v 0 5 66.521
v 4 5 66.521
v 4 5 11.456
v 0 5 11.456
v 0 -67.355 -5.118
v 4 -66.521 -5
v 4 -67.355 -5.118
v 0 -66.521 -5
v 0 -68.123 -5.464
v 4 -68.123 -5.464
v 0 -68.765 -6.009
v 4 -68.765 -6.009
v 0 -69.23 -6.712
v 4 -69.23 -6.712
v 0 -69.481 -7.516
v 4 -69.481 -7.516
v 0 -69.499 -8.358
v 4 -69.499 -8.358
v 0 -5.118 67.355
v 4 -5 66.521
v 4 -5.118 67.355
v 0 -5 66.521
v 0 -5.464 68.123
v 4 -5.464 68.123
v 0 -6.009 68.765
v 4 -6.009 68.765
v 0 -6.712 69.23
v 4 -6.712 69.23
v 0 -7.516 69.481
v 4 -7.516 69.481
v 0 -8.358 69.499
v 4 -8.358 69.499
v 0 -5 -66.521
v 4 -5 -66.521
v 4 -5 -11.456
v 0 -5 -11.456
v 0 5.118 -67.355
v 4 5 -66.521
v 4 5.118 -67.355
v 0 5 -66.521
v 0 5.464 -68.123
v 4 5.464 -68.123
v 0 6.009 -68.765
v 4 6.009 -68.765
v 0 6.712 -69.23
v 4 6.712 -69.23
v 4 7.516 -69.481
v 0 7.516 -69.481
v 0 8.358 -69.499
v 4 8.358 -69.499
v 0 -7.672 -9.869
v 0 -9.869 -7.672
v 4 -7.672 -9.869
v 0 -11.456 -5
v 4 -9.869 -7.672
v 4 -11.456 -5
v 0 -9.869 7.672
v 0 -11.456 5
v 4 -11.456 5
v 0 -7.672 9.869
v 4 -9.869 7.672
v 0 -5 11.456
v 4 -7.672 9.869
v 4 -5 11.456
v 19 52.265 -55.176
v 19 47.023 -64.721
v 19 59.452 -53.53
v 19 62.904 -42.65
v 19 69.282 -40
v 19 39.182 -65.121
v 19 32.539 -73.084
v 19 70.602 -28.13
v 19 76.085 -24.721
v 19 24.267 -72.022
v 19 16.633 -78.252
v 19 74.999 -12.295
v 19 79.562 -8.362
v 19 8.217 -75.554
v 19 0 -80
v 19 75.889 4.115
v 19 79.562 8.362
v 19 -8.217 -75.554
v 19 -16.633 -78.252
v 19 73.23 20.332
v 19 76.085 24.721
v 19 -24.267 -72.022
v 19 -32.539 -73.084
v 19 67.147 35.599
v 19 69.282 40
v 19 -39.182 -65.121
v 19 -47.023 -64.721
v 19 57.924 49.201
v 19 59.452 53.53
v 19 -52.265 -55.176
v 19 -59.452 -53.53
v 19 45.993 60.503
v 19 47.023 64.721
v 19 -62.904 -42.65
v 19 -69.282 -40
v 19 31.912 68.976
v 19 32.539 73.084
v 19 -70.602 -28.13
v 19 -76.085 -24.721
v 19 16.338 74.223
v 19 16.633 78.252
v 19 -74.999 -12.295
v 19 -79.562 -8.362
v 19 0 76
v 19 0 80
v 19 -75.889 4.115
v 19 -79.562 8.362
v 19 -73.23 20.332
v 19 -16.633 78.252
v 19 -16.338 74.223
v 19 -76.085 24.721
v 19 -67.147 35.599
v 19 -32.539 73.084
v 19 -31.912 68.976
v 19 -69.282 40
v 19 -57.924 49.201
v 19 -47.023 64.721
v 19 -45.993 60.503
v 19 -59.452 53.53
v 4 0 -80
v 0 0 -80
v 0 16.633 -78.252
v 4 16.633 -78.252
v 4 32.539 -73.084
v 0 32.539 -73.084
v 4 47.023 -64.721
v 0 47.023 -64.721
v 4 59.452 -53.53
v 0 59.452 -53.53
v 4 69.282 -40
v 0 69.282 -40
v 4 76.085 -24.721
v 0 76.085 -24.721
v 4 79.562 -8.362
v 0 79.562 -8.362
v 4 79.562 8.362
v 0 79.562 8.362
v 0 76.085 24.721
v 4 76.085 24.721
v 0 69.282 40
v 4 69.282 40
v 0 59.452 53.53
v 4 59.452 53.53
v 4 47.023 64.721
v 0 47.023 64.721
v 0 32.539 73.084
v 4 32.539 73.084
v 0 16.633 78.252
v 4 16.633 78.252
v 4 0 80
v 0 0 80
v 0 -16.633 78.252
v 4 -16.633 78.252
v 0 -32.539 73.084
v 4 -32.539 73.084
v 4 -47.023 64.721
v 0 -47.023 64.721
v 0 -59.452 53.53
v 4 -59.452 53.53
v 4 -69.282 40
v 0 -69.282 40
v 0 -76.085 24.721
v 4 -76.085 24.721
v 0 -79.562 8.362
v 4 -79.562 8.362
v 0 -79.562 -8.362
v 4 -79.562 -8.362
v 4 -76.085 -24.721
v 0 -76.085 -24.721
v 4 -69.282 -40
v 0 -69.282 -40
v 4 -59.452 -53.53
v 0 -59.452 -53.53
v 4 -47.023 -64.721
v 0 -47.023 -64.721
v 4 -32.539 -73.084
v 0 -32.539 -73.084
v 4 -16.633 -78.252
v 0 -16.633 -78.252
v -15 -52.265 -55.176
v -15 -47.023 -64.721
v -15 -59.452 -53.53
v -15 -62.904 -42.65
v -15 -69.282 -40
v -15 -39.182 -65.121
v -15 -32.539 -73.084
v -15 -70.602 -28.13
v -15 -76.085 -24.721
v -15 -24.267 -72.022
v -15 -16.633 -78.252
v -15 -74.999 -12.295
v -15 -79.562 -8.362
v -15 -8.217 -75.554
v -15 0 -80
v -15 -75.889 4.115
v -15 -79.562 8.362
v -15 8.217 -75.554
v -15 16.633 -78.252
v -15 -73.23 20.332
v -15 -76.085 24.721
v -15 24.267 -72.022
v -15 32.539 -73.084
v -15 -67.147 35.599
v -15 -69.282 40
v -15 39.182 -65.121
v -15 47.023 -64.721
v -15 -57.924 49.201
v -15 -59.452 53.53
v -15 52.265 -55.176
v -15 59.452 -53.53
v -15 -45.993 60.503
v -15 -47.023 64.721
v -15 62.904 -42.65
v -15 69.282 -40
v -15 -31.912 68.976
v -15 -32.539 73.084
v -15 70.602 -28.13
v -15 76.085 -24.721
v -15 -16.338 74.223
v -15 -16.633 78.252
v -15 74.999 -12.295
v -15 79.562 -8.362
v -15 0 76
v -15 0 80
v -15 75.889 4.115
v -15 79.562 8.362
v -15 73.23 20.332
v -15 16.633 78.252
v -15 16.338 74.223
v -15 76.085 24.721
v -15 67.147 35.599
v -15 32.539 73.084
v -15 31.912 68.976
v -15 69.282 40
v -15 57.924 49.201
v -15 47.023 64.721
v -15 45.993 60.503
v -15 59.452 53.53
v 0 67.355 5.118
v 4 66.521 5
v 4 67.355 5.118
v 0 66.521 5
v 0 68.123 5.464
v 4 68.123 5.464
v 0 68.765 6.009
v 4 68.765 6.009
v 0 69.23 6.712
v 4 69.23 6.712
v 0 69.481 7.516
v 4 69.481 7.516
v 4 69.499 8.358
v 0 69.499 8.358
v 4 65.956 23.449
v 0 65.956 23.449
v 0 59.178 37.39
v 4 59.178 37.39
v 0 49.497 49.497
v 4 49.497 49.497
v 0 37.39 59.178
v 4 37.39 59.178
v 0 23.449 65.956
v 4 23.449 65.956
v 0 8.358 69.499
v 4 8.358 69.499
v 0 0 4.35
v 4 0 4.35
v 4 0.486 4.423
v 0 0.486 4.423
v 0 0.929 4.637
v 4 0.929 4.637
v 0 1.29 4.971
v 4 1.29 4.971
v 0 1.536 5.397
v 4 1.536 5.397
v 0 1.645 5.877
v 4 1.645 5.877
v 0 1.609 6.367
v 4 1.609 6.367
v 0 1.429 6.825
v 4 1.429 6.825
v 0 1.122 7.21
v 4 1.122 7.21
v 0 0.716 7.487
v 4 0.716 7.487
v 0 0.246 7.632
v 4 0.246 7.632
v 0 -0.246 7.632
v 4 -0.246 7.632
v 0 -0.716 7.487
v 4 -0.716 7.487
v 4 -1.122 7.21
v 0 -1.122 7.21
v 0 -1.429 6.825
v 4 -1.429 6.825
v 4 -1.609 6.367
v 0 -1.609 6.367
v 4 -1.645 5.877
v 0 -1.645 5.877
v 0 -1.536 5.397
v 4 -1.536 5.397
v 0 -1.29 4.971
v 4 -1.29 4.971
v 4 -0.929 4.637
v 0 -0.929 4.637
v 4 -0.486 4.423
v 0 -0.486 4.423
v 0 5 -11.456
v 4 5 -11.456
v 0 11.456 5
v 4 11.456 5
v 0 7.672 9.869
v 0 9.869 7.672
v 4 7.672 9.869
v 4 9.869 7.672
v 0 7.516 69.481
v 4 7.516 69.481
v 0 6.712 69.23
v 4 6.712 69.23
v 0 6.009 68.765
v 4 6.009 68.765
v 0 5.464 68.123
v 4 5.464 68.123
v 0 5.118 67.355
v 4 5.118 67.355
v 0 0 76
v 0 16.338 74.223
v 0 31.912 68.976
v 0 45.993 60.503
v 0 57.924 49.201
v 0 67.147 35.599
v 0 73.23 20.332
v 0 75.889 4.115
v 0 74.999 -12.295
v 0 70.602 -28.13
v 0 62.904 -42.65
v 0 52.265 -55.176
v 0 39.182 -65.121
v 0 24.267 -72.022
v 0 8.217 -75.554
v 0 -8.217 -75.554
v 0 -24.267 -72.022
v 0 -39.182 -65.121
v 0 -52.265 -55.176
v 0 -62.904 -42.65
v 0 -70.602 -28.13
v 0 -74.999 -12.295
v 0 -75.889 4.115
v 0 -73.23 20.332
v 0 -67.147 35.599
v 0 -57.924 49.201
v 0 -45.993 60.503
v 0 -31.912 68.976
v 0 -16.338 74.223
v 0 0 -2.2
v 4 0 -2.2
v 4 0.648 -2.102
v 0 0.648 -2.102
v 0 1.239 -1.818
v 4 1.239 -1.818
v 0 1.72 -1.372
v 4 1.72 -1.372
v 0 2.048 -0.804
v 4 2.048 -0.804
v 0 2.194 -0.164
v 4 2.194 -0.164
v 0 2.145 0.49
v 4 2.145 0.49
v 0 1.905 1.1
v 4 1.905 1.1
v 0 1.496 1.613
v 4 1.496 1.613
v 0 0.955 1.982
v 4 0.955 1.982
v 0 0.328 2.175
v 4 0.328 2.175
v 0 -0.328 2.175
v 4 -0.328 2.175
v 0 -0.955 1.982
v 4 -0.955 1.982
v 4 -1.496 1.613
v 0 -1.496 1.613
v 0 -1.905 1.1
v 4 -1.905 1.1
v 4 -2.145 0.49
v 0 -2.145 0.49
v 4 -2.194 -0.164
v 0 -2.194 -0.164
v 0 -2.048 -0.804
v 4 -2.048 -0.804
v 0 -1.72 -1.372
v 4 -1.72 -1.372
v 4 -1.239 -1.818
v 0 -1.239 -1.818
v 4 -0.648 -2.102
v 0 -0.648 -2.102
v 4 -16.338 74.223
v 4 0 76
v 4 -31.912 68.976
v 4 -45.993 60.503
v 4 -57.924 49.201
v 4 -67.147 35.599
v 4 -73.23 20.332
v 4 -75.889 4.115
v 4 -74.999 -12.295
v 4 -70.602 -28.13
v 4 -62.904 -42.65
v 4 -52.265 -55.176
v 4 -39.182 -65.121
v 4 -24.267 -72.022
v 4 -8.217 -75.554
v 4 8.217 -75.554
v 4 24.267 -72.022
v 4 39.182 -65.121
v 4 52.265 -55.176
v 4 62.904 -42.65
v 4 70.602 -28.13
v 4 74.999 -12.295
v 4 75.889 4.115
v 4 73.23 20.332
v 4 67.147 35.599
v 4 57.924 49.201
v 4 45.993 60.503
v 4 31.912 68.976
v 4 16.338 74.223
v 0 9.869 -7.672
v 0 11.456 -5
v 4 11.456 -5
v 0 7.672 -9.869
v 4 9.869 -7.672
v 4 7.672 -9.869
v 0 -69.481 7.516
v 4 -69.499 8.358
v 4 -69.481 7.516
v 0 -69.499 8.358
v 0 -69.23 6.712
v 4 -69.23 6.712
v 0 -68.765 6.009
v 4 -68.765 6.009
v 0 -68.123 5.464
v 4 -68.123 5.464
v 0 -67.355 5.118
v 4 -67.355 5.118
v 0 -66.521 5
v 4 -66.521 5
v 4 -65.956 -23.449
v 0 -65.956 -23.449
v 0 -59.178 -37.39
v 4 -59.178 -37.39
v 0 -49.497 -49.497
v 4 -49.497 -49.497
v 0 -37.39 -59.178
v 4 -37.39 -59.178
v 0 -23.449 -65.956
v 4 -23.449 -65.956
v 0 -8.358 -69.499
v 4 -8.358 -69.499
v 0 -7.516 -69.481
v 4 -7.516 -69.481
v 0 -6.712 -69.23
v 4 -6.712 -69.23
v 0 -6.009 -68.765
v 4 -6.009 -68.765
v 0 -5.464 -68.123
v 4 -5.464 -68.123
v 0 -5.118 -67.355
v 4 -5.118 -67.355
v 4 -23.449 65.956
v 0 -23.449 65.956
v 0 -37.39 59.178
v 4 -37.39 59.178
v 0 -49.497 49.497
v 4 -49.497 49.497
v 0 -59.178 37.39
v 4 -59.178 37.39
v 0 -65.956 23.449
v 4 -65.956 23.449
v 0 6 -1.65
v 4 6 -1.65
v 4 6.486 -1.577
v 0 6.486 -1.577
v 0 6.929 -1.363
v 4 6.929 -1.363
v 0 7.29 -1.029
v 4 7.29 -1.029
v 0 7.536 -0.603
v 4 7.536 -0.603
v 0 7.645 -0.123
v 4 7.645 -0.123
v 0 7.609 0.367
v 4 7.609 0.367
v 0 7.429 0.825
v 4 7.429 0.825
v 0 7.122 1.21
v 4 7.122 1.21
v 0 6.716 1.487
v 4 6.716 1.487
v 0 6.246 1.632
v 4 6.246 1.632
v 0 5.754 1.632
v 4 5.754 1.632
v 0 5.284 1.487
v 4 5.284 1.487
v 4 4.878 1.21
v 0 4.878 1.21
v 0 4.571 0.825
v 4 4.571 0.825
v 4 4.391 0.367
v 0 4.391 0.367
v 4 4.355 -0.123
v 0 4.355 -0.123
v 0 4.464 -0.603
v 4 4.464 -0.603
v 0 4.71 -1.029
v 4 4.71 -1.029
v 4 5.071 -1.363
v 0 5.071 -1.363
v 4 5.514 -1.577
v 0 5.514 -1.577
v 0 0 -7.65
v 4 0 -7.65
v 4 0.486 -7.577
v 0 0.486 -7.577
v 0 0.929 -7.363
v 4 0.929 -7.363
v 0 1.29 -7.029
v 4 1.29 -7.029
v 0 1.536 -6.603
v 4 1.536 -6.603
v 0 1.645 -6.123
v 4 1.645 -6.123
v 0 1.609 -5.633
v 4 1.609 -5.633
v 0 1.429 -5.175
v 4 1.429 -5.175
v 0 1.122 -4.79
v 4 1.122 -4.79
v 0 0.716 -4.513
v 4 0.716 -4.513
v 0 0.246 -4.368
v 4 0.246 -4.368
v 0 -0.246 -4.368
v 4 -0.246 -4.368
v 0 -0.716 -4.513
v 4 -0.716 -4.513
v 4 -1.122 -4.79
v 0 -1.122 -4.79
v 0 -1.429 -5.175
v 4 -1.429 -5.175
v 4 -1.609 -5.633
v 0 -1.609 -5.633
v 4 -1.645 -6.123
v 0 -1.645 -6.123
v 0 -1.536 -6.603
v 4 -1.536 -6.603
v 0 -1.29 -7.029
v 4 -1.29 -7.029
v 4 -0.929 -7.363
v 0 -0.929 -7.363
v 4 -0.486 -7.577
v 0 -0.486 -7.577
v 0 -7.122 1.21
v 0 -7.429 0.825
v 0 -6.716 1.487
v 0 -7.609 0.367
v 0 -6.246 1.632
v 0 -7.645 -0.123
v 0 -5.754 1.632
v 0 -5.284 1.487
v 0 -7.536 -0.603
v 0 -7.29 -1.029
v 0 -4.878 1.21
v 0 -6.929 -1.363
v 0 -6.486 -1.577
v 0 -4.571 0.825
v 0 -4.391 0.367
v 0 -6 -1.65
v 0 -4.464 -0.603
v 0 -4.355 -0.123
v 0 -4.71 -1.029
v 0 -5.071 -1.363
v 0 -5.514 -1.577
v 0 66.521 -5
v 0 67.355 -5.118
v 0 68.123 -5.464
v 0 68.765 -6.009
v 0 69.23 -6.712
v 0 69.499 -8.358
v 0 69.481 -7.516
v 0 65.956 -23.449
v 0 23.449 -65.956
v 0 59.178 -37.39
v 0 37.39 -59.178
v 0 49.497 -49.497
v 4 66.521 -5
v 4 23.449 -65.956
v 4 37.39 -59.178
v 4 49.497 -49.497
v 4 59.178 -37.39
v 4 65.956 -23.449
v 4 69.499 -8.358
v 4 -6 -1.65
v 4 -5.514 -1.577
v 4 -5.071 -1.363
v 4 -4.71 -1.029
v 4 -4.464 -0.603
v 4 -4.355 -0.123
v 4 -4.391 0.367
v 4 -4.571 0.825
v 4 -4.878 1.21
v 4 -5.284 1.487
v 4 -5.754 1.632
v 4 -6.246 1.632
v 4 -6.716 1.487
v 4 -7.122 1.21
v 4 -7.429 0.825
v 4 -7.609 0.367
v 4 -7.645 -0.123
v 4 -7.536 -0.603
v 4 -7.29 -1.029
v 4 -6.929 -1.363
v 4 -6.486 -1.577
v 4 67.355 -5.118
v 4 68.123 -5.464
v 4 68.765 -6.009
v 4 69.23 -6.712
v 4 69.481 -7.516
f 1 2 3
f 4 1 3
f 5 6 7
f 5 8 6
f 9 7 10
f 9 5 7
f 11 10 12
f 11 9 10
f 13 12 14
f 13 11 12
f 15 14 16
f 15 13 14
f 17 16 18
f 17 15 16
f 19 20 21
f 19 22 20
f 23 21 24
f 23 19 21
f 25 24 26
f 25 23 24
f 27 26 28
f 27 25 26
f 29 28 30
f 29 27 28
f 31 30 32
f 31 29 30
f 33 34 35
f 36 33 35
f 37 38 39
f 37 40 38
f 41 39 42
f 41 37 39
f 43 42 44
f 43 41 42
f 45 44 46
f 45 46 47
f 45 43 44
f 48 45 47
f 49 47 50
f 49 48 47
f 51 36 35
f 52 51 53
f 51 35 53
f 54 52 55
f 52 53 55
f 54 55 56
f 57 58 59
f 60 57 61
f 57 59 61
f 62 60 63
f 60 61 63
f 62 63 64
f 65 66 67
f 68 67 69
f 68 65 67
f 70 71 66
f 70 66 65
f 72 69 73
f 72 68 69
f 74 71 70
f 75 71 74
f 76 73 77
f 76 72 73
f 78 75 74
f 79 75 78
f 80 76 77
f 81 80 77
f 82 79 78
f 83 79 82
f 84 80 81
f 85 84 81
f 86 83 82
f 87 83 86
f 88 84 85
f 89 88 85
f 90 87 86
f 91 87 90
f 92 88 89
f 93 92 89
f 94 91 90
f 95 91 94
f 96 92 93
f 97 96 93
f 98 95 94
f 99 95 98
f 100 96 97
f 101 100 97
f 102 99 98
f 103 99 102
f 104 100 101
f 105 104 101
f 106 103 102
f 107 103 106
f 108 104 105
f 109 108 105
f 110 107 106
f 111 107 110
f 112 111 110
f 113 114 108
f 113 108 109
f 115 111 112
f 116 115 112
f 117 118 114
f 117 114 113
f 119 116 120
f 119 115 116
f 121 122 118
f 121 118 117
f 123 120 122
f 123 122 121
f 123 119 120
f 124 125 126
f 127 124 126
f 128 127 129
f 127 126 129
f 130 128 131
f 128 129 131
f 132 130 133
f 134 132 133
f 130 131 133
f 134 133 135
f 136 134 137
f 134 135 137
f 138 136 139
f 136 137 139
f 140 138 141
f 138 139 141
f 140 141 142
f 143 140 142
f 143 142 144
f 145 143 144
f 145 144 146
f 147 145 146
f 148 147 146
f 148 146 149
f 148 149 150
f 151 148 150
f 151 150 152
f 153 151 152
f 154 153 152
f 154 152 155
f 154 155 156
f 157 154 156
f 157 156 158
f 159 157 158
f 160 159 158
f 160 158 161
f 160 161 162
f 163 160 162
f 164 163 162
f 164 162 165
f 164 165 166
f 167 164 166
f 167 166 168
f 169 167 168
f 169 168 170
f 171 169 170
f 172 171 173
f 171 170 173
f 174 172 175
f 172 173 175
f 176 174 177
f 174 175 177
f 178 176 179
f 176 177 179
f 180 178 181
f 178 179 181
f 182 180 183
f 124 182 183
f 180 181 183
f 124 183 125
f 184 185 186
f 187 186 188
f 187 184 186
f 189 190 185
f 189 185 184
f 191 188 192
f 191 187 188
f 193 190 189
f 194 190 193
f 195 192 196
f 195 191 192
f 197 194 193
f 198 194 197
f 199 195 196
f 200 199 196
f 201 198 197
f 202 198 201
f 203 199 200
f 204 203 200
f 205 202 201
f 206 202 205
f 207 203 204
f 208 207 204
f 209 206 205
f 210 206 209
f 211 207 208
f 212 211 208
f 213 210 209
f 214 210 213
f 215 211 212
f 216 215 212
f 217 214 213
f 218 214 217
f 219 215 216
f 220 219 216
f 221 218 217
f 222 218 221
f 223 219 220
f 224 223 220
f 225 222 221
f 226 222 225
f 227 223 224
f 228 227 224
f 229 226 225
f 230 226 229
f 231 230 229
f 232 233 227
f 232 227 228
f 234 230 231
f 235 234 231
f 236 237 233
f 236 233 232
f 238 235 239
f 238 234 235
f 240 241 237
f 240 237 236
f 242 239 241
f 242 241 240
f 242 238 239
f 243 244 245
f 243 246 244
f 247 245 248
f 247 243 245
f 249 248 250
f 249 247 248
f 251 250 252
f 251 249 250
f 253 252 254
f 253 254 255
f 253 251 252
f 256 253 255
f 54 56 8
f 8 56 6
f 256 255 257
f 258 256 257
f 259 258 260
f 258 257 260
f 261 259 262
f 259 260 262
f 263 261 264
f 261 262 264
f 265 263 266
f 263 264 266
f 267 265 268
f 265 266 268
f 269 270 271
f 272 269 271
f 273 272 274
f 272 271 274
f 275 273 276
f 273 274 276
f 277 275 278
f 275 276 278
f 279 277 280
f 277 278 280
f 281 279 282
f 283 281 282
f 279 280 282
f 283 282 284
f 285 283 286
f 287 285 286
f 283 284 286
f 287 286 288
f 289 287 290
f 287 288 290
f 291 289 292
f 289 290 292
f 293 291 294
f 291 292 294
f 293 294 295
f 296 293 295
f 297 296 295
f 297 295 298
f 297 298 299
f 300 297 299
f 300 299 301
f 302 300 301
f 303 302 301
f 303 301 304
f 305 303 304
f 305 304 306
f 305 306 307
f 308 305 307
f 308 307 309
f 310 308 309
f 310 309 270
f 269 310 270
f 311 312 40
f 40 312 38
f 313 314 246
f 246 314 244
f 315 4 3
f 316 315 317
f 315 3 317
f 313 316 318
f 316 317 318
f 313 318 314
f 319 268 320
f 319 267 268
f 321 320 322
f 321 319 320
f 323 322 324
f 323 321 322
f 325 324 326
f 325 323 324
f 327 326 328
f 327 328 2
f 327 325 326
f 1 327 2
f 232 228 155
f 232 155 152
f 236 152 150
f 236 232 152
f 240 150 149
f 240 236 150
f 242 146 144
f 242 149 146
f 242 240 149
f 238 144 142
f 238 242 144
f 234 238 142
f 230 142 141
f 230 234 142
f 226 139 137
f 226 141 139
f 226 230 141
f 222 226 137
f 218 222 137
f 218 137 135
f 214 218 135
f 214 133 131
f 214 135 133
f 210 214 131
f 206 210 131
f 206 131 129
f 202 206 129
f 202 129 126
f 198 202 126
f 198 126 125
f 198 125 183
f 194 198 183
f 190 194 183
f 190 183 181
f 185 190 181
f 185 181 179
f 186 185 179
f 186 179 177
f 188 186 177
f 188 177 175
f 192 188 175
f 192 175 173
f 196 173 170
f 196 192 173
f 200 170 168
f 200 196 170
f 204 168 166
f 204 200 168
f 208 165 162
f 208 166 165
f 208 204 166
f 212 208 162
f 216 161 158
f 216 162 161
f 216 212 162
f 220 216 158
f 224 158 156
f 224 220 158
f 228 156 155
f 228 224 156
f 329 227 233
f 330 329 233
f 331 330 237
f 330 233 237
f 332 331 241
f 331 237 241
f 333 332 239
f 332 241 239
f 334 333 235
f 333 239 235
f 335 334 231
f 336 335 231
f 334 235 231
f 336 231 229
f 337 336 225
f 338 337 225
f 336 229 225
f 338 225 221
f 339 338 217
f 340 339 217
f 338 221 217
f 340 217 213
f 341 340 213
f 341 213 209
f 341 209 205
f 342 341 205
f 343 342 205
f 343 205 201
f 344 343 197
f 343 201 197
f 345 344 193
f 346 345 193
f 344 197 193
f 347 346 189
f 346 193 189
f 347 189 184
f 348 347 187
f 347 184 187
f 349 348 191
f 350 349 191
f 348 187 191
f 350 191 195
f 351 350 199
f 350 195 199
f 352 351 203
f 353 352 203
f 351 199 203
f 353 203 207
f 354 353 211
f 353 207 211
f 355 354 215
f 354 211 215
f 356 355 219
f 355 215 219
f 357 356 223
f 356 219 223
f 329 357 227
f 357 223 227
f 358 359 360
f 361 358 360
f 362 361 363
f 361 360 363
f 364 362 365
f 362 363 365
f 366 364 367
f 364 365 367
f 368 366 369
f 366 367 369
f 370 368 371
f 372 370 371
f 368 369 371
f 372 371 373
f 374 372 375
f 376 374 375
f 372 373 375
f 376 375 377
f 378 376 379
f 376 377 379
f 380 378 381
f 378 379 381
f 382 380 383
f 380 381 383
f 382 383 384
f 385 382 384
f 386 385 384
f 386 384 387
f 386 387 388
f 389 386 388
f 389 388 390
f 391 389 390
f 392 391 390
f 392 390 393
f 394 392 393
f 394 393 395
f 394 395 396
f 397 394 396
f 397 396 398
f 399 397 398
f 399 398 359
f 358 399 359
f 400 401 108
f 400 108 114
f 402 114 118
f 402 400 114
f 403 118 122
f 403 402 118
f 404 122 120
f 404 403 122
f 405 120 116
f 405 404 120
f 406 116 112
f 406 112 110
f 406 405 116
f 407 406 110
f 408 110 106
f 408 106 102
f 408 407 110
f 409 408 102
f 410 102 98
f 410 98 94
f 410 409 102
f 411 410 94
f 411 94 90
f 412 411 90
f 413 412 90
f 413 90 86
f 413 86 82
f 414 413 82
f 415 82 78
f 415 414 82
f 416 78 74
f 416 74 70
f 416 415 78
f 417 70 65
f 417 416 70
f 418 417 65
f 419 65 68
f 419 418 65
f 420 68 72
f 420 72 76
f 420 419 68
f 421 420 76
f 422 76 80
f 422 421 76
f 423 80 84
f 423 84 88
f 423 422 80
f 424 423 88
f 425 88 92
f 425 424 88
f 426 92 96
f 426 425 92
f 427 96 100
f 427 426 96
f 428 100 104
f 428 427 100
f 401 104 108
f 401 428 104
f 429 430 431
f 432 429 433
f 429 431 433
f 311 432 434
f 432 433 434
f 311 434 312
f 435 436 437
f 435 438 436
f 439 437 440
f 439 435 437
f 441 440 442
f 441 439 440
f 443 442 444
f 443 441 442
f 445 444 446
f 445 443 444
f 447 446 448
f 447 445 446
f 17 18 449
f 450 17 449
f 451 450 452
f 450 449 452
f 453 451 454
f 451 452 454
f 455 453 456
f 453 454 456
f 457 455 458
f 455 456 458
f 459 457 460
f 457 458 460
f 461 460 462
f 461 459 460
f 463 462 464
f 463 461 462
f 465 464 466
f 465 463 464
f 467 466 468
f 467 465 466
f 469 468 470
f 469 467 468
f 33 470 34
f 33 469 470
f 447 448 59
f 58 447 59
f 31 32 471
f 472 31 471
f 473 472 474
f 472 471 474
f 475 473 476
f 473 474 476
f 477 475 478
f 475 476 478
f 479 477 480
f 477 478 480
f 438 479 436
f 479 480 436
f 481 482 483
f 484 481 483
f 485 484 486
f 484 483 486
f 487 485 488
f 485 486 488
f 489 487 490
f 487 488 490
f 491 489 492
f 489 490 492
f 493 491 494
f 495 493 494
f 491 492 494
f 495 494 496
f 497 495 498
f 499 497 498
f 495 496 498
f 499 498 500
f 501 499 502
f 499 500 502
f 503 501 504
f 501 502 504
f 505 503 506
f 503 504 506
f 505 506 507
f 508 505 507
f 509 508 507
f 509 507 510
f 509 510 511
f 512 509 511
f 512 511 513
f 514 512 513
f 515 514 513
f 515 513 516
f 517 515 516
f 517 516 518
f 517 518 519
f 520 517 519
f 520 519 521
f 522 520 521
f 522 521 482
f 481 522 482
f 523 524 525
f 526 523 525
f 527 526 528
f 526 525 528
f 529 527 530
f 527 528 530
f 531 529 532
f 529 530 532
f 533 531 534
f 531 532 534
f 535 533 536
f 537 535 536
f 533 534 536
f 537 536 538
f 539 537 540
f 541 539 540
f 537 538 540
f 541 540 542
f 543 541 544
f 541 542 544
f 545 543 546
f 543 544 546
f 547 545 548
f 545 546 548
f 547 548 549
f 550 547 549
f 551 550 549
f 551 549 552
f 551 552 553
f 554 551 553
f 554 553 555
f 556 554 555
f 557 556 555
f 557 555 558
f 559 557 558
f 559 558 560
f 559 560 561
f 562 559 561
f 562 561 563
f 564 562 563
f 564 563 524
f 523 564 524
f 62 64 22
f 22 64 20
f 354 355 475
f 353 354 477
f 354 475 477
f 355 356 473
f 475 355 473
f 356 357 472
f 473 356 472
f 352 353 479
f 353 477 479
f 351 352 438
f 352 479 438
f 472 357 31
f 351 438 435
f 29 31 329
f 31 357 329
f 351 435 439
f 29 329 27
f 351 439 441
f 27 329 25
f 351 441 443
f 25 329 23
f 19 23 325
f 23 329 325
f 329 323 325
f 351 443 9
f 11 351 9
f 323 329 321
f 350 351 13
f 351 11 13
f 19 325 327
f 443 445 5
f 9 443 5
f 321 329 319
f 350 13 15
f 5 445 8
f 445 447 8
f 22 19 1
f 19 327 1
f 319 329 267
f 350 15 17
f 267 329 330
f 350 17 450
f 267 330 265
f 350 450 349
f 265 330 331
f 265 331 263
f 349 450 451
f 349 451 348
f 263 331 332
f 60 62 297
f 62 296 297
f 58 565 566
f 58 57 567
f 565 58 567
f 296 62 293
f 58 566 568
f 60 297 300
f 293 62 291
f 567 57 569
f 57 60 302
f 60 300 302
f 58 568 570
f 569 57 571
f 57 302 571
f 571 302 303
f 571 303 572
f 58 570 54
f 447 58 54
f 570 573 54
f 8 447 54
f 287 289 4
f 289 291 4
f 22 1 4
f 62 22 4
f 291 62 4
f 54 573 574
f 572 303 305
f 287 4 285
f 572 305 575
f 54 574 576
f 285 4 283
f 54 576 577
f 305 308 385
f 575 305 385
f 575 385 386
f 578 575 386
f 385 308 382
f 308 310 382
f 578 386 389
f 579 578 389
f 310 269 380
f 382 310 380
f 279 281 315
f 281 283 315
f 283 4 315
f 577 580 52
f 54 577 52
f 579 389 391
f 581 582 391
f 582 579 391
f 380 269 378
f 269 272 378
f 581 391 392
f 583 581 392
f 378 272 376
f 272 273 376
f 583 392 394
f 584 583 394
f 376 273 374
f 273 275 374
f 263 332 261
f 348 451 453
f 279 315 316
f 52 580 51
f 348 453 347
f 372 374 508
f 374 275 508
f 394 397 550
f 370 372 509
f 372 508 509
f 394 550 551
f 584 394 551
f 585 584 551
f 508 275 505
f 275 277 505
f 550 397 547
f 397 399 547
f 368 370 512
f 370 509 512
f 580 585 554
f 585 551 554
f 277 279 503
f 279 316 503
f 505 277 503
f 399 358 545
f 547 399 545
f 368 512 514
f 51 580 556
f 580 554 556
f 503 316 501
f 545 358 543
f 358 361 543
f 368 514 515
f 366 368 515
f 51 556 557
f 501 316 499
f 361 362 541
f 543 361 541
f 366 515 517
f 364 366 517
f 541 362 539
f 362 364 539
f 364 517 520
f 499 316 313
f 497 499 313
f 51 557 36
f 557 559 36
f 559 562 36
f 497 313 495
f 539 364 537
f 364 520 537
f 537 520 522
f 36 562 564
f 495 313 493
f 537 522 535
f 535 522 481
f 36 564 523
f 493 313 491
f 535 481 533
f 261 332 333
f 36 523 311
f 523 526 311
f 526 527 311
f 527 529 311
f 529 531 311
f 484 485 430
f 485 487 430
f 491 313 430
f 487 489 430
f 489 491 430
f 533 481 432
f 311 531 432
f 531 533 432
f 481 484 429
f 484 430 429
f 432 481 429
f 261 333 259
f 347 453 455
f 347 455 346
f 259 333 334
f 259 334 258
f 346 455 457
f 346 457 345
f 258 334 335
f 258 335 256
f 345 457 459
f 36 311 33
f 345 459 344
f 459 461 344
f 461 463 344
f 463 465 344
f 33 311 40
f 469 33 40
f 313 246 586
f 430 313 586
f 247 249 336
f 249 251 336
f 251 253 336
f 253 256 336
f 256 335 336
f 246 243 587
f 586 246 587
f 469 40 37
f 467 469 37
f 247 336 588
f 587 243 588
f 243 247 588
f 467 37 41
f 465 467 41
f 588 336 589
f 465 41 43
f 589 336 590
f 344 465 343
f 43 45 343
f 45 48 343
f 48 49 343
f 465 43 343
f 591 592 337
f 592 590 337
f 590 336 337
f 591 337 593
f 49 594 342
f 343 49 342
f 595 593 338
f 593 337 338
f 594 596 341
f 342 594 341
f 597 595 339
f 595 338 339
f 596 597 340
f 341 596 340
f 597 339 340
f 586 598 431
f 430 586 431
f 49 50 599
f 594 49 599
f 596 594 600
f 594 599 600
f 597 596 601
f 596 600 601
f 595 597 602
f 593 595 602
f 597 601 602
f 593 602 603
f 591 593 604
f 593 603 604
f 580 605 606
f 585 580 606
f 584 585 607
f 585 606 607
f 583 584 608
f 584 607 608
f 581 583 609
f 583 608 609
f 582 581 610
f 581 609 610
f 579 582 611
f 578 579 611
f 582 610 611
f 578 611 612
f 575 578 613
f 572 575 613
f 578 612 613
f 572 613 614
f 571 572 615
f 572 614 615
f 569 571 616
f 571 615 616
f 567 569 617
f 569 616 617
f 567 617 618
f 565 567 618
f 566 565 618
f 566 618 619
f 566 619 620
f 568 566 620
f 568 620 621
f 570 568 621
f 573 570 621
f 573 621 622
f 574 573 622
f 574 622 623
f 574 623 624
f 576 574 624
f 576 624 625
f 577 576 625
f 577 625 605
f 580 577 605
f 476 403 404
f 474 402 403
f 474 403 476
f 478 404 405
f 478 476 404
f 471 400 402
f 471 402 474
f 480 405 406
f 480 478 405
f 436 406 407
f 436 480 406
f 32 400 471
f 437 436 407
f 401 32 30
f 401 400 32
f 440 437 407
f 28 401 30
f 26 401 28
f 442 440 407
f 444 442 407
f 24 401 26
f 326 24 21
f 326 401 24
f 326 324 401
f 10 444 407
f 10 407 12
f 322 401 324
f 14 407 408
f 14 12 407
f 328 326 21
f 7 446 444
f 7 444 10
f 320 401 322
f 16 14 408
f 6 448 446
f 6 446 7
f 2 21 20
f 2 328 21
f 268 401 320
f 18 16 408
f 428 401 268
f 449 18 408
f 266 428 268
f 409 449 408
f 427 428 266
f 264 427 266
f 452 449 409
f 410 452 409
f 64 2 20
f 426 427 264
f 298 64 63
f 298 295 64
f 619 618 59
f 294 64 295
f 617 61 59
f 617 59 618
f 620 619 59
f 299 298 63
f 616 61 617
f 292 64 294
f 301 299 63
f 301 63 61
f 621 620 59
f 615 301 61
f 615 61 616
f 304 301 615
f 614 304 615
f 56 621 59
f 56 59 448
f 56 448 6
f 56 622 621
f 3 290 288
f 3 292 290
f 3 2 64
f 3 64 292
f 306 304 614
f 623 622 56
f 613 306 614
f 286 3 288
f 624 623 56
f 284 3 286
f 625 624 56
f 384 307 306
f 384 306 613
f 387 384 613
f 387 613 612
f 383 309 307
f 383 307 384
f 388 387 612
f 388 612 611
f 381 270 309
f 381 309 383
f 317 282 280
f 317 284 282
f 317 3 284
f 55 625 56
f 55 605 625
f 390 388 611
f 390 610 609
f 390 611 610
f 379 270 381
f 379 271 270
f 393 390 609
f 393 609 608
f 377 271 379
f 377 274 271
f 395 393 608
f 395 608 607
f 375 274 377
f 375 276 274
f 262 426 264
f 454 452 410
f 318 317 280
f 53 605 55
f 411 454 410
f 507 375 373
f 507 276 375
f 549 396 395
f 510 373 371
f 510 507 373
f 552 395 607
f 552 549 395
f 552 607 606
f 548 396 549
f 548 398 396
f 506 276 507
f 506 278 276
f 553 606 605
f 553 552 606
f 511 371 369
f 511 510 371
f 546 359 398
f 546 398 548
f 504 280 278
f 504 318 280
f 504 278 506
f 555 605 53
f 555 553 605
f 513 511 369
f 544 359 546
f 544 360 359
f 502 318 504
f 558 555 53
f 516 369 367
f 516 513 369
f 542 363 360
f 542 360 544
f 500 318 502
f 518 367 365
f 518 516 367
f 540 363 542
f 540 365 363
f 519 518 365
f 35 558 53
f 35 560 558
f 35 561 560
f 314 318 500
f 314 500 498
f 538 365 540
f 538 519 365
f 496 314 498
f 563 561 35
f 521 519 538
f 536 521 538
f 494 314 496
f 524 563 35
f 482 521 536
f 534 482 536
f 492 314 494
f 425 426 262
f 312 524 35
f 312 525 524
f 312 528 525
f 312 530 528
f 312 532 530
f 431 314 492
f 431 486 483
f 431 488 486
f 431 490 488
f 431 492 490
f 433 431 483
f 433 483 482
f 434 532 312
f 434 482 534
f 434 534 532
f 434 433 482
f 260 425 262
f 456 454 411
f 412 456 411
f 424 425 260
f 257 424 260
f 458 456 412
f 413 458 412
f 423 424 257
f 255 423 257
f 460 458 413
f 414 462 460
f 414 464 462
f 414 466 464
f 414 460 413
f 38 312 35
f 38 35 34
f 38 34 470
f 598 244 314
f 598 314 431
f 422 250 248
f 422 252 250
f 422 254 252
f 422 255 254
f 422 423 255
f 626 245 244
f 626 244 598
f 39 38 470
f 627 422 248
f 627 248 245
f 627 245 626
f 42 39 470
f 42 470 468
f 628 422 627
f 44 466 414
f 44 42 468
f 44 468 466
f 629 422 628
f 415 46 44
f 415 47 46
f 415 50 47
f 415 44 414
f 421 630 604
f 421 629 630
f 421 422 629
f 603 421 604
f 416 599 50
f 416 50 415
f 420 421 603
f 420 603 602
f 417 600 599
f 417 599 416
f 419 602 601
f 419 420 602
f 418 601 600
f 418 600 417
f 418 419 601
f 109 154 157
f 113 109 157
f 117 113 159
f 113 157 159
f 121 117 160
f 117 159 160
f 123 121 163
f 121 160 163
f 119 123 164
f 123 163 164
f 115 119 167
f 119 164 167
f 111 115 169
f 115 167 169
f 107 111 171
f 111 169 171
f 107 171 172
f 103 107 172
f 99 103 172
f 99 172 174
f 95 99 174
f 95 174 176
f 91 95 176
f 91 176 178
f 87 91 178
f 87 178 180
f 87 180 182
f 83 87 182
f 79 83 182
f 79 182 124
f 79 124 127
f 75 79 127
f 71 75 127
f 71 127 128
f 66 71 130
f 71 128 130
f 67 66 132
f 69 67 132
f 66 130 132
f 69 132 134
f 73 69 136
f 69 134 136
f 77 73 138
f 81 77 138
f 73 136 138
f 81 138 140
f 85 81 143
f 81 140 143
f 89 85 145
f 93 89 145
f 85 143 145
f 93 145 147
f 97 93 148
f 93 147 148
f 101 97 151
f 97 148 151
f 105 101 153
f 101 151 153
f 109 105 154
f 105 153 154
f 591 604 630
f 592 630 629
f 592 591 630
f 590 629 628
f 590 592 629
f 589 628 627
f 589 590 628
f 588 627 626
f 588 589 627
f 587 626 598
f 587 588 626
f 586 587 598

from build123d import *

# Parameters (mm, degrees)
SKETCH3_R           = 80
BOSS_EXTRUDE3_DEPTH = 4
SKETCH5_R           = 1.65
CUT_EXTRUDE3_DEPTH  = 114.207773585
CUT_EXTRUDE4_DEPTH  = 114.207773585
CIRPATTERN2_COUNT   = 4
FILLET2_R           = 3
BOSS_EXTRUDE4_START = 15
SKETCH7_R           = 80
SKETCH7_R_2         = 76
BOSS_EXTRUDE4_DEPTH = 15
SKETCH8_R           = 2.2
CUT_EXTRUDE5_DEPTH  = 115.721401665
SKETCH9_R           = 80
SKETCH9_R_2         = 76
BOSS_EXTRUDE5_DEPTH = 15


with BuildPart() as part:
    # Sketch3 → Boss-Extrude3 (new body)
    with BuildSketch(Plane.YZ):
        with Locations(Location((0, 0, 0), (0, 0, 270))):
            Circle(SKETCH3_R)
    extrude(amount=BOSS_EXTRUDE3_DEPTH)

    # Sketch5 → Cut-Extrude3 (cut, through all)
    with BuildSketch(Plane.YZ.offset(4)):
        with Locations(Location((0, 6, 0), (0, 0, 270))):
            Circle(SKETCH5_R)
        with Locations(Location((6, 0, 0), (0, 0, 270))):
            Circle(SKETCH5_R)
        with Locations(Location((0, -6, 0), (0, 0, 270))):
            Circle(SKETCH5_R)
        with Locations(Location((-6, 0, 0), (0, 0, 270))):
            Circle(SKETCH5_R)
    extrude(amount=-CUT_EXTRUDE3_DEPTH, mode=Mode.SUBTRACT)

    # Sketch6 → Cut-Extrude4 (cut, through all)
    with BuildSketch(Plane.YZ.offset(4)):
        with BuildLine():
            Line((11.456439237, 5), (69.821200219, 5))
            ThreePointArc((69.821200219, 5), (49.497474683, 49.497474683), (5, 69.821200219))
            Line((5, 69.821200219), (5, 11.456439237))
            ThreePointArc((5, 11.456439237), (8.838834765, 8.838834765), (11.456439237, 5))
        make_face()
    cut_extrude4 = extrude(amount=-CUT_EXTRUDE4_DEPTH, mode=Mode.SUBTRACT)

    # CirPattern2: Cut-Extrude4 ×4 about axis
    cirpattern2_axis = Axis((0, 0, 0), (1, 0, 0))
    for i in range(1, CIRPATTERN2_COUNT):
        add(cut_extrude4.rotate(cirpattern2_axis, i * 360 / CIRPATTERN2_COUNT), mode=Mode.SUBTRACT)

    # Fillet2
    fillet2_edges = [part.edges().sort_by_distance(p)[0] for p in [
        (2, 5, 69.821200219),
        (2, 69.821200219, 5),
        (2, 69.821200219, -5),
        (2, 5, -69.821200219),
        (2, -5, -69.821200219),
        (2, -69.821200219, -5),
        (2, -69.821200219, 5),
        (2, -5, 69.821200219),
    ]]
    fillet(fillet2_edges, radius=FILLET2_R)

    # Sketch7 → Boss-Extrude4 (add)
    with BuildSketch(Plane(origin=(0, 0, 0), x_dir=(0, -1, 0), z_dir=(-1, 0, 0)).offset(BOSS_EXTRUDE4_START)):
        with Locations(Location((0, 0, 0), (0, 0, 90))):
            Circle(SKETCH7_R)
        with Locations(Location((0, 0, 0), (0, 0, 90))):
            Circle(SKETCH7_R_2, mode=Mode.SUBTRACT)
    extrude(amount=-BOSS_EXTRUDE4_DEPTH)

    # Sketch8 → Cut-Extrude5 (cut, through all)
    with BuildSketch(Plane.YZ.offset(4)):
        with Locations(Location((0, 0, 0), (0, 0, 270))):
            Circle(SKETCH8_R)
    extrude(amount=-CUT_EXTRUDE5_DEPTH, mode=Mode.SUBTRACT)

    # Sketch9 → Boss-Extrude5 (add)
    with BuildSketch(Plane.YZ.offset(4)):
        with Locations(Location((0, 0, 0), (0, 0, 90))):
            Circle(SKETCH9_R)
        with Locations(Location((0, 0, 0), (0, 0, 90))):
            Circle(SKETCH9_R_2, mode=Mode.SUBTRACT)
    extrude(amount=BOSS_EXTRUDE5_DEPTH)


solid = part.part
